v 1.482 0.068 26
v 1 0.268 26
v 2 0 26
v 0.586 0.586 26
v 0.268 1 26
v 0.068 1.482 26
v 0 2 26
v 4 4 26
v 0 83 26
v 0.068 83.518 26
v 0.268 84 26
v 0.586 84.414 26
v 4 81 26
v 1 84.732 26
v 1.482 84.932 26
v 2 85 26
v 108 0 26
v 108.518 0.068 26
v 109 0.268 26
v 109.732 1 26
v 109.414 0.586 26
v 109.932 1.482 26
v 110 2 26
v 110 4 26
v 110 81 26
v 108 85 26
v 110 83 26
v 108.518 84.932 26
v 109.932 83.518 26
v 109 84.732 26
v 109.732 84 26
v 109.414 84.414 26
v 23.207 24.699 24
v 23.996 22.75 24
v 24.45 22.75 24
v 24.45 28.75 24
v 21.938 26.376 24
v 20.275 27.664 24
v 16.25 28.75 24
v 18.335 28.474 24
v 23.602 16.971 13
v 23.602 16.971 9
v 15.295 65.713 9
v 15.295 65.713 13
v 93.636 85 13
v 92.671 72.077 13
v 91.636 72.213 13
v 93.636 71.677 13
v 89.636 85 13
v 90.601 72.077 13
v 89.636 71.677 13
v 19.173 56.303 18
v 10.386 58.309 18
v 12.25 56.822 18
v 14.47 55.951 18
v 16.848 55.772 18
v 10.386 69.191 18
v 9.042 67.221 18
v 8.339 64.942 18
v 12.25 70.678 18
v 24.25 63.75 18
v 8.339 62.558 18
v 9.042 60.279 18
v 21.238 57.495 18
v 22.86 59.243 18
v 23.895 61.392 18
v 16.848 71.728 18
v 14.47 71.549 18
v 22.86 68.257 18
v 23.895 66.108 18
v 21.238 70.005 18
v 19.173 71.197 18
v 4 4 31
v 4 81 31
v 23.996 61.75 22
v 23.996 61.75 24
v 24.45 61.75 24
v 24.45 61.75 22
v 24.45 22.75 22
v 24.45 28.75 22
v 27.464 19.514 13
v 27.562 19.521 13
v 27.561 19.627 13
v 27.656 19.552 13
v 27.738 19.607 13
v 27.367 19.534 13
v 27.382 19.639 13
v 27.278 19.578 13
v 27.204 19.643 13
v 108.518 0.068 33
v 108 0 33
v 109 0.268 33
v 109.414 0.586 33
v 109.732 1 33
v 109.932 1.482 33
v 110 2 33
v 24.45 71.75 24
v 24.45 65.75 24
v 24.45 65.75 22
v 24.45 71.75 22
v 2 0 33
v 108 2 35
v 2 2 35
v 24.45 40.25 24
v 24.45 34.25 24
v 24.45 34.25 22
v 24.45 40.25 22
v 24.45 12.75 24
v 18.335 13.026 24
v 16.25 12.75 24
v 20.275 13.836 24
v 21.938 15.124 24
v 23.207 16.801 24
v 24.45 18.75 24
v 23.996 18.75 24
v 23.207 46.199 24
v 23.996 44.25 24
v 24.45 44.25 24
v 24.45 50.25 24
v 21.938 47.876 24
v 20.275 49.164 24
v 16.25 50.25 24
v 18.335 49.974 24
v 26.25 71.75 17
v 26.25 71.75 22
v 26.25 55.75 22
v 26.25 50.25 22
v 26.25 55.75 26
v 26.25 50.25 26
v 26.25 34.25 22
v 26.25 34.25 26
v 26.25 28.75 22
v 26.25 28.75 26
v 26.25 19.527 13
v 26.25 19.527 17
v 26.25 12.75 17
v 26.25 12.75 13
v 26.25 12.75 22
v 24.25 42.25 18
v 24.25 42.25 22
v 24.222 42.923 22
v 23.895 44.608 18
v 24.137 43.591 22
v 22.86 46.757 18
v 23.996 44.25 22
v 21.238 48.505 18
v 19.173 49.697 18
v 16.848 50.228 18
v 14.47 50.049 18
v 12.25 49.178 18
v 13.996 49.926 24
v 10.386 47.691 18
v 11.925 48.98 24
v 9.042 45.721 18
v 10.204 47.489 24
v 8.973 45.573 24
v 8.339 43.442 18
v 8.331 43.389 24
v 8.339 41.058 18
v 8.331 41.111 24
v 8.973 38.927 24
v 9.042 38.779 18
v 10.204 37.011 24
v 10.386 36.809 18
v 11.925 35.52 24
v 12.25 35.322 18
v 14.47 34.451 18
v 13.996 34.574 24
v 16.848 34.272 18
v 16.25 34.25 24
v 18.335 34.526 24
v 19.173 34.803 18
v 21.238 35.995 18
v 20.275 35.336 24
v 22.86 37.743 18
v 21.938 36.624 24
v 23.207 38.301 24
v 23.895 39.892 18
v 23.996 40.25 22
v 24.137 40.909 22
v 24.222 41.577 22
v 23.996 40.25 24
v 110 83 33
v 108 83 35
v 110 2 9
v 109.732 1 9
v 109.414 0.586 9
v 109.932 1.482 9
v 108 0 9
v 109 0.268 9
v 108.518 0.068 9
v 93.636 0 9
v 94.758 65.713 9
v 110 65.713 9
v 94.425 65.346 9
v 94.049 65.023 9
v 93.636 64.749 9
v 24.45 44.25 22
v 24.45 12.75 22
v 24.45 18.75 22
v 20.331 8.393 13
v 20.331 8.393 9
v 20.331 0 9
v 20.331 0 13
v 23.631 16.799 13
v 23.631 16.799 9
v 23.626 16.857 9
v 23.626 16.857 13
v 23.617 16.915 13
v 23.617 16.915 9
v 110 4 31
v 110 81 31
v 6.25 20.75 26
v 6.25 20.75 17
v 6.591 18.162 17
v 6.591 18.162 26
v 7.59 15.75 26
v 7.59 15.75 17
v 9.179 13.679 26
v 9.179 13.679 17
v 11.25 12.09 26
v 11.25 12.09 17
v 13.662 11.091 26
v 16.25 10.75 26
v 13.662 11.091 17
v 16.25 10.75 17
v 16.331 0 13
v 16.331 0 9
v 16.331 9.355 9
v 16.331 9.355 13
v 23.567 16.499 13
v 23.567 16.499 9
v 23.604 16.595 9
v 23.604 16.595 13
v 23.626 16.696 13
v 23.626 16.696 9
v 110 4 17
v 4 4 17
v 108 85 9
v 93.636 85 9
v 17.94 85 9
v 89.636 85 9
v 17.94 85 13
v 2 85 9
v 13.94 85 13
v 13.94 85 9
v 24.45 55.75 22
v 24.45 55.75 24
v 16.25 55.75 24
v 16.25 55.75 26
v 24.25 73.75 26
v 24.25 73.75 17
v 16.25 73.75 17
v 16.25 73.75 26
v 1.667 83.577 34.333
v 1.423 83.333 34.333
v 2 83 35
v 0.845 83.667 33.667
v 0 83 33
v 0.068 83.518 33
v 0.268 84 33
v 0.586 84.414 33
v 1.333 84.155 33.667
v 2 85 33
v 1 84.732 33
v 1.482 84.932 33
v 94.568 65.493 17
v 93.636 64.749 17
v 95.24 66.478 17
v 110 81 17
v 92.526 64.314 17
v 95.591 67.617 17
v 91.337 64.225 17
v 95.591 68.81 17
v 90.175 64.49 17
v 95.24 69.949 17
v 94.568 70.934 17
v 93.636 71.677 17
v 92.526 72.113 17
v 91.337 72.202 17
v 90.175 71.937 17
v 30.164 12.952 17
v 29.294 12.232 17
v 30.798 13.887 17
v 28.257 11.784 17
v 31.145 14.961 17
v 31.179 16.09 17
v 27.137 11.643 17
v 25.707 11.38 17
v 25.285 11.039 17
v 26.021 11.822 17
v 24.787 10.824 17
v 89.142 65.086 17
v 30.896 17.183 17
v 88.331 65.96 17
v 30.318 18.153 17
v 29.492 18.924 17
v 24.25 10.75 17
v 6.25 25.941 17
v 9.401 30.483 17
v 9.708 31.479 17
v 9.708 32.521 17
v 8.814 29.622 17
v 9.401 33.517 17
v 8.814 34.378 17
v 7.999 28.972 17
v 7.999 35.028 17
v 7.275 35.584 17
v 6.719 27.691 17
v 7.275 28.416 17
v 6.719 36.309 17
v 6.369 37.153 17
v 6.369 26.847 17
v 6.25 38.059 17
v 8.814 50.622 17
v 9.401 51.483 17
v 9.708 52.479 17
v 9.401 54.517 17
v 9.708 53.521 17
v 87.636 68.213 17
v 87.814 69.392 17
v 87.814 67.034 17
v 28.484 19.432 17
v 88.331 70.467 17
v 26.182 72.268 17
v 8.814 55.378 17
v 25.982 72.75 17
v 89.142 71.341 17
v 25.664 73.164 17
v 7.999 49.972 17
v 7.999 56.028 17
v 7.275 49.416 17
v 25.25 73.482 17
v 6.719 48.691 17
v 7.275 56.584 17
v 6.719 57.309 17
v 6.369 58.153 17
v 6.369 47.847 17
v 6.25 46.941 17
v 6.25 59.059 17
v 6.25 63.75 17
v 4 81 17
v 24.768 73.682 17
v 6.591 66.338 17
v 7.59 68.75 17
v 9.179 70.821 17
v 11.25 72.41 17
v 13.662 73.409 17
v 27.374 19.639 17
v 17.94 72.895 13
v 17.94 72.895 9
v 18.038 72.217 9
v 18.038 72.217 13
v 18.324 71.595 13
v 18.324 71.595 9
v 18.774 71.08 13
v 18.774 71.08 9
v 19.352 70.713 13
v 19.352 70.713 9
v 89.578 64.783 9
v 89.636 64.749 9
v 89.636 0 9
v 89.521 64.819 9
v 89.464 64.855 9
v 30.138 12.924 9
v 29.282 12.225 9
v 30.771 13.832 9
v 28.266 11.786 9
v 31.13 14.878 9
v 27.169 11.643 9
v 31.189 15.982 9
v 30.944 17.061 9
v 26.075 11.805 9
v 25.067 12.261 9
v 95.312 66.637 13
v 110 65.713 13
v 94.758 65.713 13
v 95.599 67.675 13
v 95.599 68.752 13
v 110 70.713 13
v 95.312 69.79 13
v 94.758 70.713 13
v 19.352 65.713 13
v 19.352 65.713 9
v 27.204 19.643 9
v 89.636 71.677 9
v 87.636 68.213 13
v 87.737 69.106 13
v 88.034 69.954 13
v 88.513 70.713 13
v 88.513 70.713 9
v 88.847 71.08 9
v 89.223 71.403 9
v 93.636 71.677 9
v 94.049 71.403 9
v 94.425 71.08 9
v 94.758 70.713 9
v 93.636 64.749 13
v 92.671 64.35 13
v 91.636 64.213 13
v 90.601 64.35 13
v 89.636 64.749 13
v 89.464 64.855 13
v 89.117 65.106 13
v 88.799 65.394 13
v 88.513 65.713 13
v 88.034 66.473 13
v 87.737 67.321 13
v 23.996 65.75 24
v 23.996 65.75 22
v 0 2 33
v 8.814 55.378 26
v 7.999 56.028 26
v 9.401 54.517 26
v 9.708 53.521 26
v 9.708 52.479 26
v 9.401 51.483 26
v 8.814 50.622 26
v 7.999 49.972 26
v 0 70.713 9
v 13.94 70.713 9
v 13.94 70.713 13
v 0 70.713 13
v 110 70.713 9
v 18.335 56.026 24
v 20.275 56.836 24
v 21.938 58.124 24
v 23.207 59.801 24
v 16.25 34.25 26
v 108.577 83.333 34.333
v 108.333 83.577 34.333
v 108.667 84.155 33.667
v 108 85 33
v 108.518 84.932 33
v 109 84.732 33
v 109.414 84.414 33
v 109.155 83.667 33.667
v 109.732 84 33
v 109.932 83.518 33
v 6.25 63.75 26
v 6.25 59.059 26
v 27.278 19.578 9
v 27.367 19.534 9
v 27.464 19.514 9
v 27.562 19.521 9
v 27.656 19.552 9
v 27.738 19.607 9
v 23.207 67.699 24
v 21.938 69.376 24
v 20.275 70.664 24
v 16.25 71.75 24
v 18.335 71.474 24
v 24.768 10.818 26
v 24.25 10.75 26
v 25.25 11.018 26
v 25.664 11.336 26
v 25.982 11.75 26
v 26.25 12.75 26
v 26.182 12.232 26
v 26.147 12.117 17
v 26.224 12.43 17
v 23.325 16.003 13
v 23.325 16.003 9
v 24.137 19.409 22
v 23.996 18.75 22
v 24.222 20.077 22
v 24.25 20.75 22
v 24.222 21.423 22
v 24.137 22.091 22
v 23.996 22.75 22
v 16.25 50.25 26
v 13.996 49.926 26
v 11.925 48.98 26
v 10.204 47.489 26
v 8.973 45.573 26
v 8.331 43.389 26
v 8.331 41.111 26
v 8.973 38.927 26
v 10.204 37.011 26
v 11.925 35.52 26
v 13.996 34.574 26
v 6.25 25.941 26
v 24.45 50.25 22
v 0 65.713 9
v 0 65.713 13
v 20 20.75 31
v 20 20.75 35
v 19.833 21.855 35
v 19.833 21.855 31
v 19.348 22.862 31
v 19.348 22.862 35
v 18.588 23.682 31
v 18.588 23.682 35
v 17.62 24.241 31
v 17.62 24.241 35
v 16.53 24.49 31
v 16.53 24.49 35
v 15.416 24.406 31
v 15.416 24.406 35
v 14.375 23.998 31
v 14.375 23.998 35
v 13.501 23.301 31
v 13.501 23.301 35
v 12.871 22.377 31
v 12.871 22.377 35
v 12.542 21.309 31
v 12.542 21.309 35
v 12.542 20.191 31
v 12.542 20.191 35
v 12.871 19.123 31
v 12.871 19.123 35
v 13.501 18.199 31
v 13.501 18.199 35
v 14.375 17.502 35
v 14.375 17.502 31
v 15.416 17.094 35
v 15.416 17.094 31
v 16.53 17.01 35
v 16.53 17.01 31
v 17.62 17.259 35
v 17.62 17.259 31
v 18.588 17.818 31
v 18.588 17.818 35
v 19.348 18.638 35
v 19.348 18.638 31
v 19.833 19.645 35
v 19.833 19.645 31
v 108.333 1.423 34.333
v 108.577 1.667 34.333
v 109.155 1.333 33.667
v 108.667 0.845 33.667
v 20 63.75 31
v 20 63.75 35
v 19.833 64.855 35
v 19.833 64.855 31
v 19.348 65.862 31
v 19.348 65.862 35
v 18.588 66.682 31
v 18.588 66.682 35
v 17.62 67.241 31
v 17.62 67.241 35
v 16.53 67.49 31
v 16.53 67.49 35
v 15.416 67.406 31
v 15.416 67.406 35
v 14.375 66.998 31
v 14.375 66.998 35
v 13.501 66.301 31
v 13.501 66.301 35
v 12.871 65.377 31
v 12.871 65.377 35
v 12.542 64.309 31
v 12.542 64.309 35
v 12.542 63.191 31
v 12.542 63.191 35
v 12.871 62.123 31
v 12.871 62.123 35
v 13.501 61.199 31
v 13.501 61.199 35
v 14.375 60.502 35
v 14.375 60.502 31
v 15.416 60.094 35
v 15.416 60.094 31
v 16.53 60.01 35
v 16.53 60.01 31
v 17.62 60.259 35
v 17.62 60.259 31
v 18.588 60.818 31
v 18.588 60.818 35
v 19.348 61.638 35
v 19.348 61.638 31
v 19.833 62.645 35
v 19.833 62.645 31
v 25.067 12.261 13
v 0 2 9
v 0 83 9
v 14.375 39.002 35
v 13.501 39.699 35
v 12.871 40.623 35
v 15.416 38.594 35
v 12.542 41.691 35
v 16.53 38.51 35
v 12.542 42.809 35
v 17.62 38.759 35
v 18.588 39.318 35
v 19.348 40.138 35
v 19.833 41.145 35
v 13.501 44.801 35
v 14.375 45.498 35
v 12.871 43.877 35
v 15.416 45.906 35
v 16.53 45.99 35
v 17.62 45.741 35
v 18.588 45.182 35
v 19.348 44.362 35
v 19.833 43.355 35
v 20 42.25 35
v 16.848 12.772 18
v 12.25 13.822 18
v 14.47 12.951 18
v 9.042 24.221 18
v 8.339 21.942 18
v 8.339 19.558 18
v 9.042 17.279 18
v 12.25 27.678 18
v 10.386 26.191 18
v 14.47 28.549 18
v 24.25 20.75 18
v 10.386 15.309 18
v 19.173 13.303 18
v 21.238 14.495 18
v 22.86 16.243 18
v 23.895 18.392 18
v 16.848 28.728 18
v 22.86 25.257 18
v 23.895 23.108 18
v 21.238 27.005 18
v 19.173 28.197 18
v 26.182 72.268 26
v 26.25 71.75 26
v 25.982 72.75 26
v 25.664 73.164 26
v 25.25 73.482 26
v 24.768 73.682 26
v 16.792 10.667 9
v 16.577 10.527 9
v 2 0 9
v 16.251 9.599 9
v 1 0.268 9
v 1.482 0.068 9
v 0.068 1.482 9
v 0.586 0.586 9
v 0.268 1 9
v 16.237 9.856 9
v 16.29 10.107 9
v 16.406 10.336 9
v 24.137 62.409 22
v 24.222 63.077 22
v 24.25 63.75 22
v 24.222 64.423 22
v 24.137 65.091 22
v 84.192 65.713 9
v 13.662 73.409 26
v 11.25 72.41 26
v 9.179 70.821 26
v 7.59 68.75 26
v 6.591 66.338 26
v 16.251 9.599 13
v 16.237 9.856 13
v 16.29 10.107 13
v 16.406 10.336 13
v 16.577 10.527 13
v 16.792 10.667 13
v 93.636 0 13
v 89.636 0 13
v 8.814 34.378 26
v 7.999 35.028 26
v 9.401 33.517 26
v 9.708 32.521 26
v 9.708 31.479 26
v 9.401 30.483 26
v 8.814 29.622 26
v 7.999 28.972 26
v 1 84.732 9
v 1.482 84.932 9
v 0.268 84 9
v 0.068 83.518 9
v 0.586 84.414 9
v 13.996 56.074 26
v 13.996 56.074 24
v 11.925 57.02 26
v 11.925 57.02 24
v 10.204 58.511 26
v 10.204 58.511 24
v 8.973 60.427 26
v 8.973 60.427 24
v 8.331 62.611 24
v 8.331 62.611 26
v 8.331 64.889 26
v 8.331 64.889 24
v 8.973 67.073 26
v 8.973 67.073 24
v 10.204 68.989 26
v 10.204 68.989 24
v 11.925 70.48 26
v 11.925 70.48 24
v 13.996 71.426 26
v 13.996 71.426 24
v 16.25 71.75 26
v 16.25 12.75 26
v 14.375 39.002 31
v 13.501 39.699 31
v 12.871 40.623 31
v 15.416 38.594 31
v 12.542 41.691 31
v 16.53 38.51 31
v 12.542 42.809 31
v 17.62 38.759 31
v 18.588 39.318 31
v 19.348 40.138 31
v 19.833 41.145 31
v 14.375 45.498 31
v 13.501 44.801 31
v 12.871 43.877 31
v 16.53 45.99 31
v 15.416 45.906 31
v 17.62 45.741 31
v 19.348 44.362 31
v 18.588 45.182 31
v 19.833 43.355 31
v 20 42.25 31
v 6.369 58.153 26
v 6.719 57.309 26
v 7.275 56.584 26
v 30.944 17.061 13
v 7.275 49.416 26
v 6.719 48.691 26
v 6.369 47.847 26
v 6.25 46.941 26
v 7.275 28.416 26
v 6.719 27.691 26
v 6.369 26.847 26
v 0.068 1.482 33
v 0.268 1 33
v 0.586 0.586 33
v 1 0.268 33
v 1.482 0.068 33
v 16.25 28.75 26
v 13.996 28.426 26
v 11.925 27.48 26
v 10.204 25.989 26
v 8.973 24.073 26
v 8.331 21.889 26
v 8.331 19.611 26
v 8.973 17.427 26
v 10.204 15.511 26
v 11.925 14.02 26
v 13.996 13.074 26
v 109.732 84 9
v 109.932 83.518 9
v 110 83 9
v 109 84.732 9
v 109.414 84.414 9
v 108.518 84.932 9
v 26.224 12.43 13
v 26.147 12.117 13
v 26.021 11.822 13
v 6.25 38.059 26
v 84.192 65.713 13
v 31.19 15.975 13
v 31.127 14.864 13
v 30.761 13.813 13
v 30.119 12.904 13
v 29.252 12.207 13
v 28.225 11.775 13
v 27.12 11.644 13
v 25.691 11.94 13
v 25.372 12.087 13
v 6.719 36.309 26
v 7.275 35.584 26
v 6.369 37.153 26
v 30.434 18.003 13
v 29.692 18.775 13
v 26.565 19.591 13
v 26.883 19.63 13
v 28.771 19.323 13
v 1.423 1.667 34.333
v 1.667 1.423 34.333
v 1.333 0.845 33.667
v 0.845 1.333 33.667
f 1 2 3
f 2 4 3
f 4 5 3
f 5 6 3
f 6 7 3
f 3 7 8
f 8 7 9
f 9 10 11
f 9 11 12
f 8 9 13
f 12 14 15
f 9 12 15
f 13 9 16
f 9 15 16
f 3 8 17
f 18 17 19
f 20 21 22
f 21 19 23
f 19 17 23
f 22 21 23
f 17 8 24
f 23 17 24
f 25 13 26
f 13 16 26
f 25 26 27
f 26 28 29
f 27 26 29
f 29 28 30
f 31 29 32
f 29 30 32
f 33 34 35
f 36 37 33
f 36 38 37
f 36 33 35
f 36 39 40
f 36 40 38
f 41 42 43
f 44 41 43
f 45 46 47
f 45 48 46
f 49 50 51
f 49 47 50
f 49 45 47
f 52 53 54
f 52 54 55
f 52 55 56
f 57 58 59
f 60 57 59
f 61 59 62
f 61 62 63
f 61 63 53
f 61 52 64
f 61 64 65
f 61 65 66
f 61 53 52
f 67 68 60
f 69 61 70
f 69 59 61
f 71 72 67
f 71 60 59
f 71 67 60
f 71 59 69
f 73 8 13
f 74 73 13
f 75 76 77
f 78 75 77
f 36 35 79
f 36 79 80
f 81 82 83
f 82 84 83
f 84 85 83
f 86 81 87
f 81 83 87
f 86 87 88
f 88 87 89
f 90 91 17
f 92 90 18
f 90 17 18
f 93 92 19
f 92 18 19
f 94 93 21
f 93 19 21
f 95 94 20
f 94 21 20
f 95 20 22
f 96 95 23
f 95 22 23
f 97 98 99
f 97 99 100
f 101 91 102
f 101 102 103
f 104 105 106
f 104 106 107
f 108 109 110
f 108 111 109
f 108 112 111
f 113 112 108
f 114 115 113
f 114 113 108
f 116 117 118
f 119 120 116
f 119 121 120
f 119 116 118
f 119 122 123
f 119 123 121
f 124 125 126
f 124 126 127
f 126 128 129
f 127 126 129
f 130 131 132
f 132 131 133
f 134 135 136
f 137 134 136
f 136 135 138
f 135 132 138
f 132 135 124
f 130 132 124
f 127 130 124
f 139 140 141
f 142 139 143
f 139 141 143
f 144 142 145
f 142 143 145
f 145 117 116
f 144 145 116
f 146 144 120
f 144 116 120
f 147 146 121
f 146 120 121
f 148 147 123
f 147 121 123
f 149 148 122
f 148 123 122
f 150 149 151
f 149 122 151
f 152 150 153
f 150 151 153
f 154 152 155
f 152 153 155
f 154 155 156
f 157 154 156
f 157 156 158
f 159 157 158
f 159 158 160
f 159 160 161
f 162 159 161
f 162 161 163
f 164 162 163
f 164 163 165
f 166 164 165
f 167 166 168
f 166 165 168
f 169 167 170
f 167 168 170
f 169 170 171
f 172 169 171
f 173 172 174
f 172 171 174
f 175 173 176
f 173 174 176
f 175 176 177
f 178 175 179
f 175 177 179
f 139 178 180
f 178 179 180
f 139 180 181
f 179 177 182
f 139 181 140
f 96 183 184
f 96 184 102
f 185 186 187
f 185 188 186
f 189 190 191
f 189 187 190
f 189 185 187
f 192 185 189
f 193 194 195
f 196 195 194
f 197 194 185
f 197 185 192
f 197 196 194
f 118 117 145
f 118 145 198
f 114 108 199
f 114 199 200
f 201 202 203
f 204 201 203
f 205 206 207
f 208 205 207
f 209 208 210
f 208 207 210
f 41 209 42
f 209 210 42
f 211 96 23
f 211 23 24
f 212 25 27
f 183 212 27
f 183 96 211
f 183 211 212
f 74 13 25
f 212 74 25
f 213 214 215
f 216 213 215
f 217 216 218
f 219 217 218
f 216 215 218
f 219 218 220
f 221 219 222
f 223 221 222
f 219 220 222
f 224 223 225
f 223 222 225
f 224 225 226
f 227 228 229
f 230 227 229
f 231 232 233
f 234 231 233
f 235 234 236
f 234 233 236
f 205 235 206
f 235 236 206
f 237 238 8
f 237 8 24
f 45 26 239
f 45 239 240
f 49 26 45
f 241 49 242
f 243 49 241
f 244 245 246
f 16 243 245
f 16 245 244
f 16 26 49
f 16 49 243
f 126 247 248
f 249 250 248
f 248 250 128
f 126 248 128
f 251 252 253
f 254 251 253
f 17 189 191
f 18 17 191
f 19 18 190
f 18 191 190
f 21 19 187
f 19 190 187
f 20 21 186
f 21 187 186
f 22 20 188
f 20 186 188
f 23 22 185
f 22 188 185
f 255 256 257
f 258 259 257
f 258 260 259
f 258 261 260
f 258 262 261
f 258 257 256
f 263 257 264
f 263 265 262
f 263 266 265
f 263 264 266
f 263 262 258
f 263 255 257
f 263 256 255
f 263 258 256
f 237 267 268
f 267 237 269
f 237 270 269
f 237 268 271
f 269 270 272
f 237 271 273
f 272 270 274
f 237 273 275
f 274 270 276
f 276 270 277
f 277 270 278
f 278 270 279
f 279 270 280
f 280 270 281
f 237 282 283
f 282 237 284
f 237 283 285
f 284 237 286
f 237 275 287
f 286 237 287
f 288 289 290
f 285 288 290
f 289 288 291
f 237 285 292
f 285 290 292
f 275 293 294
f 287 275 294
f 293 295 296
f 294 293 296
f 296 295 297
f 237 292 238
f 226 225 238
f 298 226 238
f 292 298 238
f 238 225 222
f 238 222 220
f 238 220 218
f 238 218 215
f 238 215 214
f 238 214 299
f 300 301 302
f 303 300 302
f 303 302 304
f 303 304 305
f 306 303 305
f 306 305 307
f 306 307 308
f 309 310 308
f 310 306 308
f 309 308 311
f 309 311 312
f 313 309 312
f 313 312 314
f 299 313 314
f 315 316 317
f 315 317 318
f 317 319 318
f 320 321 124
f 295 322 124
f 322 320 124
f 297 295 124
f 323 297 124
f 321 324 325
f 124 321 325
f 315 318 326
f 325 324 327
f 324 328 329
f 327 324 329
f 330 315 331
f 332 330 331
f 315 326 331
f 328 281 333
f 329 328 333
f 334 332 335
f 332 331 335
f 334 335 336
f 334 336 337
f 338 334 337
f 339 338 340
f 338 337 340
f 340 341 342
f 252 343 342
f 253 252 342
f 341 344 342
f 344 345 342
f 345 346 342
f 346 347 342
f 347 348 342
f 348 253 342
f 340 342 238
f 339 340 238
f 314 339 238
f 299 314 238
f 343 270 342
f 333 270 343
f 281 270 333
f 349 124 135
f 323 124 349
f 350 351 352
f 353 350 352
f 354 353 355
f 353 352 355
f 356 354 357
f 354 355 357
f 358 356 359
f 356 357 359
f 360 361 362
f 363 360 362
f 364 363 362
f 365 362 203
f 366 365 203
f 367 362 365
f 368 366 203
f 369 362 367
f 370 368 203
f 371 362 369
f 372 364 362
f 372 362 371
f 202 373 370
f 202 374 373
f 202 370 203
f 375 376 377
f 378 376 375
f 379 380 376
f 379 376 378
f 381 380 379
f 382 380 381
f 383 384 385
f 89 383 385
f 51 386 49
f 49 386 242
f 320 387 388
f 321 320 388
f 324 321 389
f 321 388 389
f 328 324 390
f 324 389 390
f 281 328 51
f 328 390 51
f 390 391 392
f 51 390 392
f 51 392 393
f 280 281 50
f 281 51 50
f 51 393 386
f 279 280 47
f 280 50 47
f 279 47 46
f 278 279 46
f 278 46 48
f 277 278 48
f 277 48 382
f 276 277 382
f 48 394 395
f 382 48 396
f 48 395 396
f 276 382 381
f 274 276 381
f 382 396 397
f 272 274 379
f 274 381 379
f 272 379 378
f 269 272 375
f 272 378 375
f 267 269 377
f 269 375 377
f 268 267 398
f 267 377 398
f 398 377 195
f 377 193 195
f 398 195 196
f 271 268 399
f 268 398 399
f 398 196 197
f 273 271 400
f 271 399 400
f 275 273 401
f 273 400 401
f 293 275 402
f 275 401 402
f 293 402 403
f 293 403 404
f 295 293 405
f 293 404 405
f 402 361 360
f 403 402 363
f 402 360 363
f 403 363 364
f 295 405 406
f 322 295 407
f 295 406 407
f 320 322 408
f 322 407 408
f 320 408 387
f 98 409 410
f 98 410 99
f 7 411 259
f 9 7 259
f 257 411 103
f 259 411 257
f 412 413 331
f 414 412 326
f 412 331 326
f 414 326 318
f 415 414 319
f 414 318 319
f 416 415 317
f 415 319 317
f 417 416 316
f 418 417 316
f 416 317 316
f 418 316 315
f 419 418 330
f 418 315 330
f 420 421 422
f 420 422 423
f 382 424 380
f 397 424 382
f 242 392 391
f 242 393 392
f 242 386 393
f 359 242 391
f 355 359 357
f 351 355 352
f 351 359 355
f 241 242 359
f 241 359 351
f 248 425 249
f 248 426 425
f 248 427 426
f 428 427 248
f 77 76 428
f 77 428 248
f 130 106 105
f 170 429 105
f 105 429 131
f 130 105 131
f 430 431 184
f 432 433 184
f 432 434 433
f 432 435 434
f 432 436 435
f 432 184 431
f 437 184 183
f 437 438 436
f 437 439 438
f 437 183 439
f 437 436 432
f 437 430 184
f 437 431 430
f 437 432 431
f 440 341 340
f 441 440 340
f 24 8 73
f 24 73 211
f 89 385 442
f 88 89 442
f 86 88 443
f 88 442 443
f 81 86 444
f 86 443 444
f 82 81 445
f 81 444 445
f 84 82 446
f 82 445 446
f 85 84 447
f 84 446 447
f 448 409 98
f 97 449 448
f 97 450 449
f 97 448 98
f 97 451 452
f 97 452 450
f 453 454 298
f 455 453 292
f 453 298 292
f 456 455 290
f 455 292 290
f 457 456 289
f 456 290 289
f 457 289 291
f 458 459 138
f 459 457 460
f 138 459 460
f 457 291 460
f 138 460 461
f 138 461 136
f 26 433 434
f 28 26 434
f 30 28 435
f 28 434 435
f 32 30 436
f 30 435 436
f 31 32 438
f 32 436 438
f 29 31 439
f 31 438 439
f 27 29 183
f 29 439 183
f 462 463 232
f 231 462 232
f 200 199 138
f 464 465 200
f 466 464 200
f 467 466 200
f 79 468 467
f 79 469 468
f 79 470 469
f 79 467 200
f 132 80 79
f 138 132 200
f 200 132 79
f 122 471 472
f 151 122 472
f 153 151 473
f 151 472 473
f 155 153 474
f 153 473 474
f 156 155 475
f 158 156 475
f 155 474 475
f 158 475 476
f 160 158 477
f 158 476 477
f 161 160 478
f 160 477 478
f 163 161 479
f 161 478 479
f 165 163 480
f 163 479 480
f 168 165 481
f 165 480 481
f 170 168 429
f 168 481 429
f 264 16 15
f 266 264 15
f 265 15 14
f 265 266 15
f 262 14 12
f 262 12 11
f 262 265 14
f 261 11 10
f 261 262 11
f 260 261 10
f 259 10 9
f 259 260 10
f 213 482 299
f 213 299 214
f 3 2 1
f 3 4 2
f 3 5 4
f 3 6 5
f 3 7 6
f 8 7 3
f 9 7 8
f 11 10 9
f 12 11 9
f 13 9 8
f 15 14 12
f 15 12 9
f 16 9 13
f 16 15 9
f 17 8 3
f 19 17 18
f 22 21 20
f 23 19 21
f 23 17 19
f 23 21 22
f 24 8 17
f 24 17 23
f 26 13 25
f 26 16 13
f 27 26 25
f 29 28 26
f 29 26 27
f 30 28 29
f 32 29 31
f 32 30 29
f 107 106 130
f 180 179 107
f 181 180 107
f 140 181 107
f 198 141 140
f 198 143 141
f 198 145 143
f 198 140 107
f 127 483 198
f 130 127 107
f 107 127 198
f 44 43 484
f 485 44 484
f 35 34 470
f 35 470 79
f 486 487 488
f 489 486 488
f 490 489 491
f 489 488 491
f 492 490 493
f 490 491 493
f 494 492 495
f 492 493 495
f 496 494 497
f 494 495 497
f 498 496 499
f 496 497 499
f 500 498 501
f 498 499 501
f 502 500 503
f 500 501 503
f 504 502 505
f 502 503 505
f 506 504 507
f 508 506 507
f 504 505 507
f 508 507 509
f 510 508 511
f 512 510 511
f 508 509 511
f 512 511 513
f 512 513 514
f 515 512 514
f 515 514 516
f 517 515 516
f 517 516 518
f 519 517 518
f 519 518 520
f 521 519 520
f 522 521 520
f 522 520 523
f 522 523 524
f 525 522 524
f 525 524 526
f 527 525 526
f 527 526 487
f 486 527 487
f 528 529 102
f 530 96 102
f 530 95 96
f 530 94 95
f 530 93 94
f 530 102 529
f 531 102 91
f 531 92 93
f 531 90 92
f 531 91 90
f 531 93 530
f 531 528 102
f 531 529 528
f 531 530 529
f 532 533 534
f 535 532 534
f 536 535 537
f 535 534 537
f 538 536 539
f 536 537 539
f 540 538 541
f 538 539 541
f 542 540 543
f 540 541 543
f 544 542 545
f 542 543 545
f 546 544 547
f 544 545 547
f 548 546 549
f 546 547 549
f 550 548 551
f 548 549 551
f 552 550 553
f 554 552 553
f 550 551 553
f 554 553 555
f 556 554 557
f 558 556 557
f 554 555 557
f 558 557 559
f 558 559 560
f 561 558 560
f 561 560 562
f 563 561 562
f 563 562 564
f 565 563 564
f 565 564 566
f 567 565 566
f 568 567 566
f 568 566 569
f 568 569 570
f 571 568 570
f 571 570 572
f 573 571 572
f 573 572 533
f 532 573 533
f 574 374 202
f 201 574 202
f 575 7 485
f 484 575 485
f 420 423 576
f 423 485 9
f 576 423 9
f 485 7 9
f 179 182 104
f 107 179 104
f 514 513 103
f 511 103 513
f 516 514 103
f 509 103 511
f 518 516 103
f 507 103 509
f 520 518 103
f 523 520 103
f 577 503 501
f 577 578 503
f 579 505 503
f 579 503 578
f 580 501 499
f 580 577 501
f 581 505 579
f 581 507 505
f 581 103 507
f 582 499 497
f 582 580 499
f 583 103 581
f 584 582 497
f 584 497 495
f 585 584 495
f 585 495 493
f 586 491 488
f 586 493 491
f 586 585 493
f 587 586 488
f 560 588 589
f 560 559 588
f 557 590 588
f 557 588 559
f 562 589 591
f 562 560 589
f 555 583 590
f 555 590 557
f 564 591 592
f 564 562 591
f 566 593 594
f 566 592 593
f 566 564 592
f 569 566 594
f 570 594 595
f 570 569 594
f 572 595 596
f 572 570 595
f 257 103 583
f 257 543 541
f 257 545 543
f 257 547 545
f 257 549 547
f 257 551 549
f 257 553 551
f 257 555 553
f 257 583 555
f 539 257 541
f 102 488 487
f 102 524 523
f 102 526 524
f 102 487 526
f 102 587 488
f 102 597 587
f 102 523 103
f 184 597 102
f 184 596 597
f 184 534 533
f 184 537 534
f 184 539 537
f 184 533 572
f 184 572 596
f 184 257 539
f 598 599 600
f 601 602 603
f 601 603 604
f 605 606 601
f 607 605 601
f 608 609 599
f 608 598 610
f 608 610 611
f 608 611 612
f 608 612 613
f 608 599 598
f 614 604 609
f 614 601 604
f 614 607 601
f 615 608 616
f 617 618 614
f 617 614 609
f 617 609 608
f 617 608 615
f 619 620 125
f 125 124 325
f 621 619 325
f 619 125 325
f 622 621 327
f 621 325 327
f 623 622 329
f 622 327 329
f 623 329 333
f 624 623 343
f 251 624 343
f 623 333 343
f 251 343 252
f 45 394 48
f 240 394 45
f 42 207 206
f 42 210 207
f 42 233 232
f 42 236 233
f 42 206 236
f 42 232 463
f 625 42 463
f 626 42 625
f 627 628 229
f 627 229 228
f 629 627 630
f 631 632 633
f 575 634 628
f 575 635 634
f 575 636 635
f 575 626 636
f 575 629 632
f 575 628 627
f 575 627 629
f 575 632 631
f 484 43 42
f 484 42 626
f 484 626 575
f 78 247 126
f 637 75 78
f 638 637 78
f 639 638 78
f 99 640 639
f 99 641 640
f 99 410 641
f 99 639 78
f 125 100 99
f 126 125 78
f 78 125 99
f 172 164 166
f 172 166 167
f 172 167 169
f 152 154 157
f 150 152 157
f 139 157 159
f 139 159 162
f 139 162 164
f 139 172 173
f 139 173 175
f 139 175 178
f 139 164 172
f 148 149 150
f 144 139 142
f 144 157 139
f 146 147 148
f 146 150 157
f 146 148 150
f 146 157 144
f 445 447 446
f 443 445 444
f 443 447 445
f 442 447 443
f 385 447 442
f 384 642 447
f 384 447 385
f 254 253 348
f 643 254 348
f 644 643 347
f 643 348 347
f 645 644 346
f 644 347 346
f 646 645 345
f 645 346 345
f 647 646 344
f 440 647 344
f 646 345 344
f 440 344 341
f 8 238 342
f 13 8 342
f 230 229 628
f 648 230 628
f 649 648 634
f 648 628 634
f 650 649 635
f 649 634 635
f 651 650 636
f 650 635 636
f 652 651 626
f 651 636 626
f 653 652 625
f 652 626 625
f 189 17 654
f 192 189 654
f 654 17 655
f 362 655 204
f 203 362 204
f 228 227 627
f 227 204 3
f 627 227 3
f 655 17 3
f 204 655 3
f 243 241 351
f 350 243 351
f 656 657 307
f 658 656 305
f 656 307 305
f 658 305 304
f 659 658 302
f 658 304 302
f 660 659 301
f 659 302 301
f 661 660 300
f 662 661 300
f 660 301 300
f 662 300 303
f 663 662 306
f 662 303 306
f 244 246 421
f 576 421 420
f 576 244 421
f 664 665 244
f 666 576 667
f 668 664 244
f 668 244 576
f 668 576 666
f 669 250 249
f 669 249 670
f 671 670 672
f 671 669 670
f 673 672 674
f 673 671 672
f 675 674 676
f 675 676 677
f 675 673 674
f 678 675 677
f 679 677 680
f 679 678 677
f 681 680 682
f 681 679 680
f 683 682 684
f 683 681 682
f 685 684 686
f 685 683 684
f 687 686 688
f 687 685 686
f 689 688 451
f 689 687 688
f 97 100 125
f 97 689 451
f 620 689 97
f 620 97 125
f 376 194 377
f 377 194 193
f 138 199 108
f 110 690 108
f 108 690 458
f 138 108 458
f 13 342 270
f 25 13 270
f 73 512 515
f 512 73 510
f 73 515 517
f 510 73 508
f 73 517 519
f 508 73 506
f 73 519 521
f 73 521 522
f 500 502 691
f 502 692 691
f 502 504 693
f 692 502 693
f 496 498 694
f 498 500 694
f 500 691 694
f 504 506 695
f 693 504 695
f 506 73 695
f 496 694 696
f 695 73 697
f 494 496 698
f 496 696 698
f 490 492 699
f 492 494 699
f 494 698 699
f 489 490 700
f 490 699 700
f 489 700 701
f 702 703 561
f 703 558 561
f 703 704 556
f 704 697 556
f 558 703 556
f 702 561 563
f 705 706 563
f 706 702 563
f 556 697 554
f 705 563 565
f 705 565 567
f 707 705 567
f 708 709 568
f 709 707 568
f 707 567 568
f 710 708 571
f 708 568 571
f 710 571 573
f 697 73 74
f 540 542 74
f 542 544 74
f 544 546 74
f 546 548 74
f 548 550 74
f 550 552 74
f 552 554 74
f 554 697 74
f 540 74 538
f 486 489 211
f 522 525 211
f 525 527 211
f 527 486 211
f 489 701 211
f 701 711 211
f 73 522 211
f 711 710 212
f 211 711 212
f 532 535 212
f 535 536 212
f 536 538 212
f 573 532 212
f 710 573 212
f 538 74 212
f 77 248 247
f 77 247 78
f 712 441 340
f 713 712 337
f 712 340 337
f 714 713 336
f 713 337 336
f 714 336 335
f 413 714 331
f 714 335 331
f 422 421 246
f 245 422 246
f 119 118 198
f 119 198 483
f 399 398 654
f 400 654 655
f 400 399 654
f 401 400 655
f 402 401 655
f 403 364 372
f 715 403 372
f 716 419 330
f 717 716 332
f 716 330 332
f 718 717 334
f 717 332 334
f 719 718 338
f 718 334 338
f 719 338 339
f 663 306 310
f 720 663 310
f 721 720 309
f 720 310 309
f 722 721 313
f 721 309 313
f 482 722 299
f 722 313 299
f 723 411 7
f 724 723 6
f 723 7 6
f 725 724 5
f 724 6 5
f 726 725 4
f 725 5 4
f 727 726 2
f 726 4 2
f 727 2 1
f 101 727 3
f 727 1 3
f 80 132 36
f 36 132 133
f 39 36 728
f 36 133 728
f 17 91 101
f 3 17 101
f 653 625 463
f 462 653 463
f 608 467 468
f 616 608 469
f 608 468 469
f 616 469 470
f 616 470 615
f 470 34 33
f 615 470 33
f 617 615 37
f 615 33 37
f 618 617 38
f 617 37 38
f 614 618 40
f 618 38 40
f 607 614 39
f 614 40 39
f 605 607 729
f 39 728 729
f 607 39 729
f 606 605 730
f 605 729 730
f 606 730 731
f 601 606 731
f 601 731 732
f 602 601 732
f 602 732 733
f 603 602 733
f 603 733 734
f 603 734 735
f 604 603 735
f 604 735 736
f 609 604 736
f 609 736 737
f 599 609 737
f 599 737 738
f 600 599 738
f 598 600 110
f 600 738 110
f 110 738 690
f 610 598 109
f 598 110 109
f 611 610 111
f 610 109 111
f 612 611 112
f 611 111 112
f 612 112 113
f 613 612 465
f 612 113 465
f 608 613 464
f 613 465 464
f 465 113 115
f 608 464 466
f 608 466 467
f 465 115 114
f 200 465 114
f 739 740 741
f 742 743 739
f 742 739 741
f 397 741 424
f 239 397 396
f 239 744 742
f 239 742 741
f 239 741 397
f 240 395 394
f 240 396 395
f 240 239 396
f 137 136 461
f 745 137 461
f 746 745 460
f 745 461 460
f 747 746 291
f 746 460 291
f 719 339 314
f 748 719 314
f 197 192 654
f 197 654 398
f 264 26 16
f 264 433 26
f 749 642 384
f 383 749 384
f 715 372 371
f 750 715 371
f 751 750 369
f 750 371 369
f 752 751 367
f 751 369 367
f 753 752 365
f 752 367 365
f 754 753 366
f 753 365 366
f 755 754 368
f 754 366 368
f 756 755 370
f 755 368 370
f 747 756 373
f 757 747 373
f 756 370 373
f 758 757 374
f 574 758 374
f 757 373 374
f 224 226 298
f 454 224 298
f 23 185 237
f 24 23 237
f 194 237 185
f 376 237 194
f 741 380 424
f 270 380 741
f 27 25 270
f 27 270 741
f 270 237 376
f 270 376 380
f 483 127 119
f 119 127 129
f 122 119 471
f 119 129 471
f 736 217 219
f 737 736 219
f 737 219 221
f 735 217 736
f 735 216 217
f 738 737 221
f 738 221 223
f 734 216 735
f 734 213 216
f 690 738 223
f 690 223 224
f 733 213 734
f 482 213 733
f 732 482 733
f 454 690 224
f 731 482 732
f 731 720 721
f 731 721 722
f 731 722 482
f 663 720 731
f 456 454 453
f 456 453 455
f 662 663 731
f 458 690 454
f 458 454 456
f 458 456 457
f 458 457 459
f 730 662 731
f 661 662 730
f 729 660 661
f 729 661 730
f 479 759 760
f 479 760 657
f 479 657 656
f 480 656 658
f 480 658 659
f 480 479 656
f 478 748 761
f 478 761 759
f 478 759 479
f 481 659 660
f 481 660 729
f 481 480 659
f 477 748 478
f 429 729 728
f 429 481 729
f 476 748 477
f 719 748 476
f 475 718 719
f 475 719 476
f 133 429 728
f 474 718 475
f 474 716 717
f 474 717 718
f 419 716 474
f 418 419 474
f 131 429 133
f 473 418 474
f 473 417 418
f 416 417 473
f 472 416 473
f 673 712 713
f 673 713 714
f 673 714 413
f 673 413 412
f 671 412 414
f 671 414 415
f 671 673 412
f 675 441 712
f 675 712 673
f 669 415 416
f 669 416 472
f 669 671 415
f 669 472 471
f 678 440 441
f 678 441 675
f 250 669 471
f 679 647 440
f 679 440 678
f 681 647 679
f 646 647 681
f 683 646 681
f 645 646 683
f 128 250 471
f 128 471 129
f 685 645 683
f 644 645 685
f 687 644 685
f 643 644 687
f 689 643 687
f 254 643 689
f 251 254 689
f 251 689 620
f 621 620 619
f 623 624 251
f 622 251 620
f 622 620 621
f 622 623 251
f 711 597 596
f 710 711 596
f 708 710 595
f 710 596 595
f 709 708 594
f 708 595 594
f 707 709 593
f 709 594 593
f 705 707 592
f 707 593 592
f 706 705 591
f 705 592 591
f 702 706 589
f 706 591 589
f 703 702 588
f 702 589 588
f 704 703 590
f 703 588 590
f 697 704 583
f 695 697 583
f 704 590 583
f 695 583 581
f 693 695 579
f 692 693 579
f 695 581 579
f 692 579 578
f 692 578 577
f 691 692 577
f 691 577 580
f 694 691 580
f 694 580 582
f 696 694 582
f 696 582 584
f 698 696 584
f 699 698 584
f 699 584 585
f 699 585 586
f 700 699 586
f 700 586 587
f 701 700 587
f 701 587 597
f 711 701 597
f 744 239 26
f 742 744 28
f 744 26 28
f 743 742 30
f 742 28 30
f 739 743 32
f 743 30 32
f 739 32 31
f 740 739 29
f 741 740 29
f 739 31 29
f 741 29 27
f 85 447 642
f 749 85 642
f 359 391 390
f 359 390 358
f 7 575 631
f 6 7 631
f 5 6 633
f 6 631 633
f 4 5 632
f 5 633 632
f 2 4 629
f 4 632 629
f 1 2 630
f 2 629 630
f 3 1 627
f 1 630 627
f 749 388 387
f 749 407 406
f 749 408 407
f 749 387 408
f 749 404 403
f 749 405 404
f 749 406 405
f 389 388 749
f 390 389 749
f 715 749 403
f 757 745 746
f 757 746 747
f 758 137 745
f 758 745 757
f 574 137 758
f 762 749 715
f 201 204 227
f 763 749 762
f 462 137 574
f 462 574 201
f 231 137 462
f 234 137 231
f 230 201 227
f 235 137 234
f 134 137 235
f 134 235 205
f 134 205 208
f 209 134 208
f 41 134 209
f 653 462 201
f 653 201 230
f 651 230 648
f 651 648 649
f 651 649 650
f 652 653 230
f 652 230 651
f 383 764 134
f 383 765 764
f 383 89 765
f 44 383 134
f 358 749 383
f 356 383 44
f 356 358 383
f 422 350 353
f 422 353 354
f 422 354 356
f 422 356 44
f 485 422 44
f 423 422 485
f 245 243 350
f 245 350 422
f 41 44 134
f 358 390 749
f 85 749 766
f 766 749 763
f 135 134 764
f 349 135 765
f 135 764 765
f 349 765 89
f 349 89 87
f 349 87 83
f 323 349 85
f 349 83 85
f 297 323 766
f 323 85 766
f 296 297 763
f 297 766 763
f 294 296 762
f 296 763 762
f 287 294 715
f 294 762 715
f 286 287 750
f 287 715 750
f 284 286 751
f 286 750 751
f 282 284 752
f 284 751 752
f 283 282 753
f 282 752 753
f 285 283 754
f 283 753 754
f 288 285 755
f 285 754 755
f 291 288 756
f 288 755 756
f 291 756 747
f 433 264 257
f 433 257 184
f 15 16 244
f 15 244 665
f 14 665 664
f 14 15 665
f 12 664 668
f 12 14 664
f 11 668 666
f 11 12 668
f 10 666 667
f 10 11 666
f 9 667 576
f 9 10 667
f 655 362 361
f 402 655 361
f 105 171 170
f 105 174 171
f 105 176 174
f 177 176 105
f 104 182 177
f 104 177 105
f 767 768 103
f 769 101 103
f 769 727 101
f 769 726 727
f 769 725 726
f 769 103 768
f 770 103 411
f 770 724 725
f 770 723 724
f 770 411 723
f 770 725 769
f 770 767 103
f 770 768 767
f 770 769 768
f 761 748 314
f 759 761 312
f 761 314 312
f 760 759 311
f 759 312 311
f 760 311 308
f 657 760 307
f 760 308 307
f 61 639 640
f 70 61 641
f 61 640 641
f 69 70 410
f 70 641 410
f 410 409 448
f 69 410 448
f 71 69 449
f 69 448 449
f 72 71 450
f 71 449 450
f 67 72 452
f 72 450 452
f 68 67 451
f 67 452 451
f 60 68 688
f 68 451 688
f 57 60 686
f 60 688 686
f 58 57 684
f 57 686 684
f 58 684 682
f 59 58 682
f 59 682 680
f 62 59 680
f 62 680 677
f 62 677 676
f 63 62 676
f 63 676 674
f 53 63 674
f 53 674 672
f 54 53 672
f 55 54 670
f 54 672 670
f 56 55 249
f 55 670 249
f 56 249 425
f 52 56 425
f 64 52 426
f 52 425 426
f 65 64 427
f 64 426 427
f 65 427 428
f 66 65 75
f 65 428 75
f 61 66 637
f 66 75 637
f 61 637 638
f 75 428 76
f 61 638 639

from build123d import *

# Parameters (mm, degrees)
SKETCH1_W           = 110
SKETCH1_H           = 85
BOSS_EXTRUDE1_DEPTH = 35
SHELL1_T            = -4
SKETCH2_R           = 3.75
CUT_EXTRUDE1_DEPTH  = 5
BOSS_EXTRUDE2_DEPTH = 22
SKETCH4_W           = 10
SKETCH4_H           = 16
CUT_EXTRUDE2_DEPTH  = 2
SKETCH5_W           = 1.8
SKETCH5_H           = 16
CUT_EXTRUDE3_DEPTH  = 2
SKETCH6_R           = 8
CUT_EXTRUDE8_DEPTH  = 6
SKETCH7_W           = 2.18
SKETCH7_H           = 4
SKETCH7_W_2         = 2.63
CUT_EXTRUDE9_DEPTH  = 2
SKETCH8_W           = 110
SKETCH8_H           = 85
CUT_EXTRUDE10_DEPTH = 17
SKETCH9_W           = 110
SKETCH9_H           = 85
BOSS_EXTRUDE4_DEPTH = 8
SKETCH10_R          = 4
CUT_EXTRUDE11_DEPTH = 10
SKETCH11_W          = 400
SKETCH11_H          = 5
CUT_EXTRUDE12_DEPTH = 4
SKETCH12_W          = 4
SKETCH12_H          = 400
CUT_EXTRUDE13_DEPTH = 4
CUT_EXTRUDE14_DEPTH = 4
SKETCH14_R          = 4
CUT_EXTRUDE15_DEPTH = 4
BOSS_EXTRUDE5_DEPTH = 4
FILLET1_R           = 2
CHAMFER1_SIZE       = 2


with BuildPart() as part:
    # Sketch1 → Boss-Extrude1 (new body)
    with BuildSketch(Plane.XY):
        with Locations((55, 42.5)):
            Rectangle(SKETCH1_W, SKETCH1_H)
    extrude(amount=BOSS_EXTRUDE1_DEPTH)

    # Shell1
    shell1_openings = [part.faces().sort_by_distance(p)[0] for p in [
        (110, 42.5, 17.5),
    ]]
    offset(amount=SHELL1_T, openings=shell1_openings, kind=Kind.INTERSECTION)

    # Sketch2 → Cut-Extrude1 (cut)
    with BuildSketch(Plane.XY.offset(35)):
        with Locations((16.25, 63.75)):
            Circle(SKETCH2_R)
        with Locations((16.25, 42.25)):
            Circle(SKETCH2_R)
        with Locations((16.25, 20.75)):
            Circle(SKETCH2_R)
    extrude(amount=-CUT_EXTRUDE1_DEPTH, mode=Mode.SUBTRACT)

    # Sketch3 → Boss-Extrude2 (add)
    with BuildSketch(Plane.XY.offset(4)):
        with BuildLine():
            Line((6.25, 63.75), (6.25, 59.058875489))
            ThreePointArc((6.25, 59.058875489), (6.718704627, 57.309233136), (7.99928478, 56.028199621))
            ThreePointArc((7.99928478, 56.028199621), (9.747140287, 53), (7.99928478, 49.971800379))
            ThreePointArc((7.99928478, 49.971800379), (6.718704627, 48.690766864), (6.25, 46.941124511))
            Line((6.25, 46.941124511), (6.25, 38.058875489))
            ThreePointArc((6.25, 38.058875489), (6.718704627, 36.309233136), (7.99928478, 35.028199621))
            ThreePointArc((7.99928478, 35.028199621), (9.747140287, 32), (7.99928478, 28.971800379))
            ThreePointArc((7.99928478, 28.971800379), (6.718704627, 27.690766864), (6.25, 25.941124511))
            Line((6.25, 25.941124511), (6.25, 20.75))
            ThreePointArc((6.25, 20.75), (9.178932188, 13.678932188), (16.25, 10.75))
            Line((16.25, 10.75), (24.25, 10.75))
            ThreePointArc((24.25, 10.75), (25.664213562, 11.335786438), (26.25, 12.75))
            Line((26.25, 12.75), (26.25, 20.75))
            Line((26.25, 20.75), (26.25, 63.75))
            Line((26.25, 63.75), (26.25, 71.75))
            ThreePointArc((26.25, 71.75), (25.664213562, 73.164213562), (24.25, 73.75))
            Line((24.25, 73.75), (16.25, 73.75))
            ThreePointArc((16.25, 73.75), (9.178932188, 70.821067812), (6.25, 63.75))
        make_face()
    extrude(amount=BOSS_EXTRUDE2_DEPTH)

    # Sketch4 → Cut-Extrude2 (cut)
    with BuildSketch(Plane.XY.offset(26)):
        with Locations((21.25, 63.75)):
            Rectangle(SKETCH4_W, SKETCH4_H)
        with BuildLine():
            Line((16.25, 71.75), (16.25, 55.75))
            ThreePointArc((16.25, 55.75), (8.25, 63.75), (16.25, 71.75))
        make_face()
        with BuildLine():
            Line((26.25, 34.25), (26.25, 50.25))
            Line((26.25, 50.25), (16.25, 50.25))
            ThreePointArc((16.25, 50.25), (8.25, 42.25), (16.25, 34.25))
            Line((16.25, 34.25), (26.25, 34.25))
        make_face()
        with BuildLine():
            Line((26.25, 12.75), (26.25, 28.75))
            Line((26.25, 28.75), (16.25, 28.75))
            ThreePointArc((16.25, 28.75), (8.25, 20.75), (16.25, 12.75))
            Line((16.25, 12.75), (26.25, 12.75))
        make_face()
    extrude(amount=-CUT_EXTRUDE2_DEPTH, mode=Mode.SUBTRACT)

    # Sketch5 → Cut-Extrude3 (cut)
    with BuildSketch(Plane.XY.offset(24)):
        with Locations((25.35, 63.75)):
            Rectangle(SKETCH5_W, SKETCH5_H)
        with Locations((25.35, 42.25)):
            Rectangle(SKETCH5_W, SKETCH5_H)
        with Locations((25.35, 20.75)):
            Rectangle(SKETCH5_W, SKETCH5_H)
    extrude(amount=-CUT_EXTRUDE3_DEPTH, mode=Mode.SUBTRACT)

    # Sketch6 → Cut-Extrude8 (cut)
    with BuildSketch(Plane.XY.offset(24)):
        with Locations((16.25, 63.75)):
            Circle(SKETCH6_R)
        with Locations((16.25, 42.25)):
            Circle(SKETCH6_R)
        with Locations((16.25, 20.75)):
            Circle(SKETCH6_R)
    extrude(amount=-CUT_EXTRUDE8_DEPTH, mode=Mode.SUBTRACT)

    # Sketch7 → Cut-Extrude9 (cut)
    with BuildSketch(Plane.XY.offset(24)):
        with Locations((24.45, 63.75)):
            Rectangle(SKETCH7_W, SKETCH7_H)
        with Locations((24.45, 42.25)):
            Rectangle(SKETCH7_W, SKETCH7_H)
        with Locations((24.45, 20.75)):
            Rectangle(SKETCH7_W_2, SKETCH7_H)
    extrude(amount=-CUT_EXTRUDE9_DEPTH, mode=Mode.SUBTRACT)

    # Sketch8 → Cut-Extrude10 (cut)
    with BuildSketch(Plane(origin=(0, 0, 0), x_dir=(-1, 0, 0), z_dir=(0, 0, -1))):
        with Locations((-55, 42.5)):
            Rectangle(SKETCH8_W, SKETCH8_H)
    extrude(amount=-CUT_EXTRUDE10_DEPTH, mode=Mode.SUBTRACT)


with BuildPart() as cut_extrude10_piece_1:
    # of the separate pieces the step leaves, piece 1, a body of its own (cut_extrude10_pieces)
    add(part.part.solids().sort_by_distance((0, 85, 17))[0])



with BuildPart() as cut_extrude10_piece_2:
    # of the separate pieces the step leaves, piece 2, a body of its own (cut_extrude10_pieces)
    add(part.part.solids().sort_by_distance((6.25, 59.058875489, 17))[0])


with BuildPart() as cut_extrude10_piece_1_1:
    add(cut_extrude10_piece_1.part)

    add(cut_extrude10_piece_2.part)  # Boss-Extrude4 merges Cut-Extrude10 piece 2
    # Sketch9 → Boss-Extrude4 (add)
    with BuildSketch(Plane(origin=(0, 0, 17), x_dir=(-1, 0, 0), z_dir=(0, 0, -1))):
        with Locations((-55, 42.5)):
            Rectangle(SKETCH9_W, SKETCH9_H)
    extrude(amount=BOSS_EXTRUDE4_DEPTH)

    # Sketch10 → Cut-Extrude11 (cut)
    with BuildSketch(Plane(origin=(0, 0, 9), x_dir=(-1, 0, 0), z_dir=(0, 0, -1))):
        with Locations((-91.635892751, 68.213390564)):
            Circle(SKETCH10_R)
    extrude(amount=-CUT_EXTRUDE11_DEPTH, mode=Mode.SUBTRACT)

    # Sketch11 → Cut-Extrude12 (cut)
    with BuildSketch(Plane(origin=(0, 0, 9), x_dir=(-1, 0, 0), z_dir=(0, 0, -1))):
        with Locations((-95.635892751, 68.213390564)):
            Rectangle(SKETCH11_W, SKETCH11_H)
    extrude(amount=-CUT_EXTRUDE12_DEPTH, mode=Mode.SUBTRACT)

    # Sketch12 → Cut-Extrude13 (cut)
    with BuildSketch(Plane(origin=(0, 0, 9), x_dir=(-1, 0, 0), z_dir=(0, 0, -1))):
        with Locations((-91.635892751, 68.213390564)):
            Rectangle(SKETCH12_W, SKETCH12_H)
    extrude(amount=-CUT_EXTRUDE13_DEPTH, mode=Mode.SUBTRACT)

    # Sketch13 → Cut-Extrude14 (cut)
    with BuildSketch(Plane(origin=(0, 0, 9), x_dir=(-1, 0, 0), z_dir=(0, 0, -1))):
        with BuildLine():
            Line((-89.635892751, 65.95101575), (-89.635892751, 64.99515496))
            Line((-89.635892751, 64.99515496), (-30.944122707, 17.060929682))
            ThreePointArc((-30.944122707, 17.060929682), (-29.734157956, 12.544767786), (-25.067320954, 12.261279936))
            Line((-25.067320954, 12.261279936), (-20.330852628, 8.392953259))
            Line((-20.330852628, 8.392953259), (-20.330852628, 0))
            Line((-20.330852628, 0), (-16.330852628, 0))
            Line((-16.330852628, 0), (-16.330852628, 9.355434762))
            ThreePointArc((-16.330852628, 9.355434762), (-16.289752238, 10.106874078), (-16.79203771, 10.667284278))
            Line((-16.79203771, 10.667284278), (-23.325201079, 16.002991899))
            Line((-23.325201079, 16.002991899), (-23.566707085, 16.498941734))
            ThreePointArc((-23.566707085, 16.498941734), (-23.617102691, 16.645193724), (-23.630882747, 16.799269911))
            ThreePointArc((-23.630882747, 16.799269911), (-23.622128276, 16.886117691), (-23.601621561, 16.970962564))
            Line((-23.601621561, 16.970962564), (-15.294561061, 65.713390564))
            Line((-15.294561061, 65.713390564), (-19.352236465, 65.713390564))
            Line((-19.352236465, 65.713390564), (-27.203936928, 19.64282872))
            ThreePointArc((-27.203936928, 19.64282872), (-27.463571803, 19.514302093), (-27.738043433, 19.607009624))
            Line((-27.738043433, 19.607009624), (-84.191758748, 65.713390564))
            Line((-84.191758748, 65.713390564), (-88.513393752, 65.713390564))
            Line((-88.513393752, 65.713390564), (-89.635892751, 65.95101575))
        make_face()
        with BuildLine():
            Line((-13.940150026, 70.713390564), (-13.940150026, 85))
            Line((-13.940150026, 85), (-17.940150026, 85))
            Line((-17.940150026, 85), (-17.940150026, 72.894621715))
            ThreePointArc((-17.940150026, 72.894621715), (-18.323984529, 71.59541451), (-19.352236465, 70.713390564))
            Line((-19.352236465, 70.713390564), (-17.940150026, 70.713390564))
            Line((-17.940150026, 70.713390564), (-13.940150026, 70.713390564))
        make_face()
    extrude(amount=-CUT_EXTRUDE14_DEPTH, mode=Mode.SUBTRACT)

    # Sketch14 → Cut-Extrude15 (cut)
    with BuildSketch(Plane(origin=(0, 0, 13), x_dir=(-1, 0, 0), z_dir=(0, 0, -1))):
        with Locations(Location((-27.203936928, 15.64282872, 0), (0, 0, 3.848774787))):
            Circle(SKETCH14_R)
    extrude(amount=-CUT_EXTRUDE15_DEPTH, mode=Mode.SUBTRACT)

    # Sketch15 → Boss-Extrude5 (add)
    with BuildSketch(Plane(origin=(0, 0, 17), x_dir=(-1, 0, 0), z_dir=(0, 0, -1))):
        with BuildLine():
            Line((-26.25, 19.527414198), (-26.25, 12.75))
            ThreePointArc((-26.25, 12.75), (-26.192025516, 12.271944671), (-26.021463103, 11.821604354))
            ThreePointArc((-26.021463103, 11.821604354), (-23.205694932, 15.761407537), (-26.25, 19.527414198))
        make_face()
    extrude(amount=BOSS_EXTRUDE5_DEPTH)

    # Fillet1
    fillet1_edges = [cut_extrude10_piece_1_1.edges().sort_by_distance(p)[0] for p in [
        (0, 85, 22),
        (110, 85, 22),
        (110, 0, 22),
        (0, 0, 22),
    ]]
    fillet(fillet1_edges, radius=FILLET1_R)

    # Chamfer1
    chamfer1_edges = [cut_extrude10_piece_1_1.edges().sort_by_distance(p)[0] for p in [
        (0, 42.5, 35),
        (55, 85, 35),
        (55, 0, 35),
        (110, 42.5, 35),
        (109.414213562, 84.414213562, 35),
        (109.414213562, 0.585786438, 35),
        (0.585786438, 0.585786438, 35),
        (0.585786438, 84.414213562, 35),
    ]]
    chamfer(chamfer1_edges, length=CHAMFER1_SIZE)


with BuildPart() as body_2:
    # Split1: the piece on the far side of the plane
    add(cut_extrude10_piece_1_1.part)
    split(bisect_by=Plane.XY.offset(26), keep=Keep.BOTTOM)


with BuildPart() as cut_extrude10_piece_1_2:
    add(cut_extrude10_piece_1_1.part)

    # Split1
    split(bisect_by=Plane.XY.offset(26), keep=Keep.TOP)


solid = Compound([body_2.part, cut_extrude10_piece_1_2.part])
